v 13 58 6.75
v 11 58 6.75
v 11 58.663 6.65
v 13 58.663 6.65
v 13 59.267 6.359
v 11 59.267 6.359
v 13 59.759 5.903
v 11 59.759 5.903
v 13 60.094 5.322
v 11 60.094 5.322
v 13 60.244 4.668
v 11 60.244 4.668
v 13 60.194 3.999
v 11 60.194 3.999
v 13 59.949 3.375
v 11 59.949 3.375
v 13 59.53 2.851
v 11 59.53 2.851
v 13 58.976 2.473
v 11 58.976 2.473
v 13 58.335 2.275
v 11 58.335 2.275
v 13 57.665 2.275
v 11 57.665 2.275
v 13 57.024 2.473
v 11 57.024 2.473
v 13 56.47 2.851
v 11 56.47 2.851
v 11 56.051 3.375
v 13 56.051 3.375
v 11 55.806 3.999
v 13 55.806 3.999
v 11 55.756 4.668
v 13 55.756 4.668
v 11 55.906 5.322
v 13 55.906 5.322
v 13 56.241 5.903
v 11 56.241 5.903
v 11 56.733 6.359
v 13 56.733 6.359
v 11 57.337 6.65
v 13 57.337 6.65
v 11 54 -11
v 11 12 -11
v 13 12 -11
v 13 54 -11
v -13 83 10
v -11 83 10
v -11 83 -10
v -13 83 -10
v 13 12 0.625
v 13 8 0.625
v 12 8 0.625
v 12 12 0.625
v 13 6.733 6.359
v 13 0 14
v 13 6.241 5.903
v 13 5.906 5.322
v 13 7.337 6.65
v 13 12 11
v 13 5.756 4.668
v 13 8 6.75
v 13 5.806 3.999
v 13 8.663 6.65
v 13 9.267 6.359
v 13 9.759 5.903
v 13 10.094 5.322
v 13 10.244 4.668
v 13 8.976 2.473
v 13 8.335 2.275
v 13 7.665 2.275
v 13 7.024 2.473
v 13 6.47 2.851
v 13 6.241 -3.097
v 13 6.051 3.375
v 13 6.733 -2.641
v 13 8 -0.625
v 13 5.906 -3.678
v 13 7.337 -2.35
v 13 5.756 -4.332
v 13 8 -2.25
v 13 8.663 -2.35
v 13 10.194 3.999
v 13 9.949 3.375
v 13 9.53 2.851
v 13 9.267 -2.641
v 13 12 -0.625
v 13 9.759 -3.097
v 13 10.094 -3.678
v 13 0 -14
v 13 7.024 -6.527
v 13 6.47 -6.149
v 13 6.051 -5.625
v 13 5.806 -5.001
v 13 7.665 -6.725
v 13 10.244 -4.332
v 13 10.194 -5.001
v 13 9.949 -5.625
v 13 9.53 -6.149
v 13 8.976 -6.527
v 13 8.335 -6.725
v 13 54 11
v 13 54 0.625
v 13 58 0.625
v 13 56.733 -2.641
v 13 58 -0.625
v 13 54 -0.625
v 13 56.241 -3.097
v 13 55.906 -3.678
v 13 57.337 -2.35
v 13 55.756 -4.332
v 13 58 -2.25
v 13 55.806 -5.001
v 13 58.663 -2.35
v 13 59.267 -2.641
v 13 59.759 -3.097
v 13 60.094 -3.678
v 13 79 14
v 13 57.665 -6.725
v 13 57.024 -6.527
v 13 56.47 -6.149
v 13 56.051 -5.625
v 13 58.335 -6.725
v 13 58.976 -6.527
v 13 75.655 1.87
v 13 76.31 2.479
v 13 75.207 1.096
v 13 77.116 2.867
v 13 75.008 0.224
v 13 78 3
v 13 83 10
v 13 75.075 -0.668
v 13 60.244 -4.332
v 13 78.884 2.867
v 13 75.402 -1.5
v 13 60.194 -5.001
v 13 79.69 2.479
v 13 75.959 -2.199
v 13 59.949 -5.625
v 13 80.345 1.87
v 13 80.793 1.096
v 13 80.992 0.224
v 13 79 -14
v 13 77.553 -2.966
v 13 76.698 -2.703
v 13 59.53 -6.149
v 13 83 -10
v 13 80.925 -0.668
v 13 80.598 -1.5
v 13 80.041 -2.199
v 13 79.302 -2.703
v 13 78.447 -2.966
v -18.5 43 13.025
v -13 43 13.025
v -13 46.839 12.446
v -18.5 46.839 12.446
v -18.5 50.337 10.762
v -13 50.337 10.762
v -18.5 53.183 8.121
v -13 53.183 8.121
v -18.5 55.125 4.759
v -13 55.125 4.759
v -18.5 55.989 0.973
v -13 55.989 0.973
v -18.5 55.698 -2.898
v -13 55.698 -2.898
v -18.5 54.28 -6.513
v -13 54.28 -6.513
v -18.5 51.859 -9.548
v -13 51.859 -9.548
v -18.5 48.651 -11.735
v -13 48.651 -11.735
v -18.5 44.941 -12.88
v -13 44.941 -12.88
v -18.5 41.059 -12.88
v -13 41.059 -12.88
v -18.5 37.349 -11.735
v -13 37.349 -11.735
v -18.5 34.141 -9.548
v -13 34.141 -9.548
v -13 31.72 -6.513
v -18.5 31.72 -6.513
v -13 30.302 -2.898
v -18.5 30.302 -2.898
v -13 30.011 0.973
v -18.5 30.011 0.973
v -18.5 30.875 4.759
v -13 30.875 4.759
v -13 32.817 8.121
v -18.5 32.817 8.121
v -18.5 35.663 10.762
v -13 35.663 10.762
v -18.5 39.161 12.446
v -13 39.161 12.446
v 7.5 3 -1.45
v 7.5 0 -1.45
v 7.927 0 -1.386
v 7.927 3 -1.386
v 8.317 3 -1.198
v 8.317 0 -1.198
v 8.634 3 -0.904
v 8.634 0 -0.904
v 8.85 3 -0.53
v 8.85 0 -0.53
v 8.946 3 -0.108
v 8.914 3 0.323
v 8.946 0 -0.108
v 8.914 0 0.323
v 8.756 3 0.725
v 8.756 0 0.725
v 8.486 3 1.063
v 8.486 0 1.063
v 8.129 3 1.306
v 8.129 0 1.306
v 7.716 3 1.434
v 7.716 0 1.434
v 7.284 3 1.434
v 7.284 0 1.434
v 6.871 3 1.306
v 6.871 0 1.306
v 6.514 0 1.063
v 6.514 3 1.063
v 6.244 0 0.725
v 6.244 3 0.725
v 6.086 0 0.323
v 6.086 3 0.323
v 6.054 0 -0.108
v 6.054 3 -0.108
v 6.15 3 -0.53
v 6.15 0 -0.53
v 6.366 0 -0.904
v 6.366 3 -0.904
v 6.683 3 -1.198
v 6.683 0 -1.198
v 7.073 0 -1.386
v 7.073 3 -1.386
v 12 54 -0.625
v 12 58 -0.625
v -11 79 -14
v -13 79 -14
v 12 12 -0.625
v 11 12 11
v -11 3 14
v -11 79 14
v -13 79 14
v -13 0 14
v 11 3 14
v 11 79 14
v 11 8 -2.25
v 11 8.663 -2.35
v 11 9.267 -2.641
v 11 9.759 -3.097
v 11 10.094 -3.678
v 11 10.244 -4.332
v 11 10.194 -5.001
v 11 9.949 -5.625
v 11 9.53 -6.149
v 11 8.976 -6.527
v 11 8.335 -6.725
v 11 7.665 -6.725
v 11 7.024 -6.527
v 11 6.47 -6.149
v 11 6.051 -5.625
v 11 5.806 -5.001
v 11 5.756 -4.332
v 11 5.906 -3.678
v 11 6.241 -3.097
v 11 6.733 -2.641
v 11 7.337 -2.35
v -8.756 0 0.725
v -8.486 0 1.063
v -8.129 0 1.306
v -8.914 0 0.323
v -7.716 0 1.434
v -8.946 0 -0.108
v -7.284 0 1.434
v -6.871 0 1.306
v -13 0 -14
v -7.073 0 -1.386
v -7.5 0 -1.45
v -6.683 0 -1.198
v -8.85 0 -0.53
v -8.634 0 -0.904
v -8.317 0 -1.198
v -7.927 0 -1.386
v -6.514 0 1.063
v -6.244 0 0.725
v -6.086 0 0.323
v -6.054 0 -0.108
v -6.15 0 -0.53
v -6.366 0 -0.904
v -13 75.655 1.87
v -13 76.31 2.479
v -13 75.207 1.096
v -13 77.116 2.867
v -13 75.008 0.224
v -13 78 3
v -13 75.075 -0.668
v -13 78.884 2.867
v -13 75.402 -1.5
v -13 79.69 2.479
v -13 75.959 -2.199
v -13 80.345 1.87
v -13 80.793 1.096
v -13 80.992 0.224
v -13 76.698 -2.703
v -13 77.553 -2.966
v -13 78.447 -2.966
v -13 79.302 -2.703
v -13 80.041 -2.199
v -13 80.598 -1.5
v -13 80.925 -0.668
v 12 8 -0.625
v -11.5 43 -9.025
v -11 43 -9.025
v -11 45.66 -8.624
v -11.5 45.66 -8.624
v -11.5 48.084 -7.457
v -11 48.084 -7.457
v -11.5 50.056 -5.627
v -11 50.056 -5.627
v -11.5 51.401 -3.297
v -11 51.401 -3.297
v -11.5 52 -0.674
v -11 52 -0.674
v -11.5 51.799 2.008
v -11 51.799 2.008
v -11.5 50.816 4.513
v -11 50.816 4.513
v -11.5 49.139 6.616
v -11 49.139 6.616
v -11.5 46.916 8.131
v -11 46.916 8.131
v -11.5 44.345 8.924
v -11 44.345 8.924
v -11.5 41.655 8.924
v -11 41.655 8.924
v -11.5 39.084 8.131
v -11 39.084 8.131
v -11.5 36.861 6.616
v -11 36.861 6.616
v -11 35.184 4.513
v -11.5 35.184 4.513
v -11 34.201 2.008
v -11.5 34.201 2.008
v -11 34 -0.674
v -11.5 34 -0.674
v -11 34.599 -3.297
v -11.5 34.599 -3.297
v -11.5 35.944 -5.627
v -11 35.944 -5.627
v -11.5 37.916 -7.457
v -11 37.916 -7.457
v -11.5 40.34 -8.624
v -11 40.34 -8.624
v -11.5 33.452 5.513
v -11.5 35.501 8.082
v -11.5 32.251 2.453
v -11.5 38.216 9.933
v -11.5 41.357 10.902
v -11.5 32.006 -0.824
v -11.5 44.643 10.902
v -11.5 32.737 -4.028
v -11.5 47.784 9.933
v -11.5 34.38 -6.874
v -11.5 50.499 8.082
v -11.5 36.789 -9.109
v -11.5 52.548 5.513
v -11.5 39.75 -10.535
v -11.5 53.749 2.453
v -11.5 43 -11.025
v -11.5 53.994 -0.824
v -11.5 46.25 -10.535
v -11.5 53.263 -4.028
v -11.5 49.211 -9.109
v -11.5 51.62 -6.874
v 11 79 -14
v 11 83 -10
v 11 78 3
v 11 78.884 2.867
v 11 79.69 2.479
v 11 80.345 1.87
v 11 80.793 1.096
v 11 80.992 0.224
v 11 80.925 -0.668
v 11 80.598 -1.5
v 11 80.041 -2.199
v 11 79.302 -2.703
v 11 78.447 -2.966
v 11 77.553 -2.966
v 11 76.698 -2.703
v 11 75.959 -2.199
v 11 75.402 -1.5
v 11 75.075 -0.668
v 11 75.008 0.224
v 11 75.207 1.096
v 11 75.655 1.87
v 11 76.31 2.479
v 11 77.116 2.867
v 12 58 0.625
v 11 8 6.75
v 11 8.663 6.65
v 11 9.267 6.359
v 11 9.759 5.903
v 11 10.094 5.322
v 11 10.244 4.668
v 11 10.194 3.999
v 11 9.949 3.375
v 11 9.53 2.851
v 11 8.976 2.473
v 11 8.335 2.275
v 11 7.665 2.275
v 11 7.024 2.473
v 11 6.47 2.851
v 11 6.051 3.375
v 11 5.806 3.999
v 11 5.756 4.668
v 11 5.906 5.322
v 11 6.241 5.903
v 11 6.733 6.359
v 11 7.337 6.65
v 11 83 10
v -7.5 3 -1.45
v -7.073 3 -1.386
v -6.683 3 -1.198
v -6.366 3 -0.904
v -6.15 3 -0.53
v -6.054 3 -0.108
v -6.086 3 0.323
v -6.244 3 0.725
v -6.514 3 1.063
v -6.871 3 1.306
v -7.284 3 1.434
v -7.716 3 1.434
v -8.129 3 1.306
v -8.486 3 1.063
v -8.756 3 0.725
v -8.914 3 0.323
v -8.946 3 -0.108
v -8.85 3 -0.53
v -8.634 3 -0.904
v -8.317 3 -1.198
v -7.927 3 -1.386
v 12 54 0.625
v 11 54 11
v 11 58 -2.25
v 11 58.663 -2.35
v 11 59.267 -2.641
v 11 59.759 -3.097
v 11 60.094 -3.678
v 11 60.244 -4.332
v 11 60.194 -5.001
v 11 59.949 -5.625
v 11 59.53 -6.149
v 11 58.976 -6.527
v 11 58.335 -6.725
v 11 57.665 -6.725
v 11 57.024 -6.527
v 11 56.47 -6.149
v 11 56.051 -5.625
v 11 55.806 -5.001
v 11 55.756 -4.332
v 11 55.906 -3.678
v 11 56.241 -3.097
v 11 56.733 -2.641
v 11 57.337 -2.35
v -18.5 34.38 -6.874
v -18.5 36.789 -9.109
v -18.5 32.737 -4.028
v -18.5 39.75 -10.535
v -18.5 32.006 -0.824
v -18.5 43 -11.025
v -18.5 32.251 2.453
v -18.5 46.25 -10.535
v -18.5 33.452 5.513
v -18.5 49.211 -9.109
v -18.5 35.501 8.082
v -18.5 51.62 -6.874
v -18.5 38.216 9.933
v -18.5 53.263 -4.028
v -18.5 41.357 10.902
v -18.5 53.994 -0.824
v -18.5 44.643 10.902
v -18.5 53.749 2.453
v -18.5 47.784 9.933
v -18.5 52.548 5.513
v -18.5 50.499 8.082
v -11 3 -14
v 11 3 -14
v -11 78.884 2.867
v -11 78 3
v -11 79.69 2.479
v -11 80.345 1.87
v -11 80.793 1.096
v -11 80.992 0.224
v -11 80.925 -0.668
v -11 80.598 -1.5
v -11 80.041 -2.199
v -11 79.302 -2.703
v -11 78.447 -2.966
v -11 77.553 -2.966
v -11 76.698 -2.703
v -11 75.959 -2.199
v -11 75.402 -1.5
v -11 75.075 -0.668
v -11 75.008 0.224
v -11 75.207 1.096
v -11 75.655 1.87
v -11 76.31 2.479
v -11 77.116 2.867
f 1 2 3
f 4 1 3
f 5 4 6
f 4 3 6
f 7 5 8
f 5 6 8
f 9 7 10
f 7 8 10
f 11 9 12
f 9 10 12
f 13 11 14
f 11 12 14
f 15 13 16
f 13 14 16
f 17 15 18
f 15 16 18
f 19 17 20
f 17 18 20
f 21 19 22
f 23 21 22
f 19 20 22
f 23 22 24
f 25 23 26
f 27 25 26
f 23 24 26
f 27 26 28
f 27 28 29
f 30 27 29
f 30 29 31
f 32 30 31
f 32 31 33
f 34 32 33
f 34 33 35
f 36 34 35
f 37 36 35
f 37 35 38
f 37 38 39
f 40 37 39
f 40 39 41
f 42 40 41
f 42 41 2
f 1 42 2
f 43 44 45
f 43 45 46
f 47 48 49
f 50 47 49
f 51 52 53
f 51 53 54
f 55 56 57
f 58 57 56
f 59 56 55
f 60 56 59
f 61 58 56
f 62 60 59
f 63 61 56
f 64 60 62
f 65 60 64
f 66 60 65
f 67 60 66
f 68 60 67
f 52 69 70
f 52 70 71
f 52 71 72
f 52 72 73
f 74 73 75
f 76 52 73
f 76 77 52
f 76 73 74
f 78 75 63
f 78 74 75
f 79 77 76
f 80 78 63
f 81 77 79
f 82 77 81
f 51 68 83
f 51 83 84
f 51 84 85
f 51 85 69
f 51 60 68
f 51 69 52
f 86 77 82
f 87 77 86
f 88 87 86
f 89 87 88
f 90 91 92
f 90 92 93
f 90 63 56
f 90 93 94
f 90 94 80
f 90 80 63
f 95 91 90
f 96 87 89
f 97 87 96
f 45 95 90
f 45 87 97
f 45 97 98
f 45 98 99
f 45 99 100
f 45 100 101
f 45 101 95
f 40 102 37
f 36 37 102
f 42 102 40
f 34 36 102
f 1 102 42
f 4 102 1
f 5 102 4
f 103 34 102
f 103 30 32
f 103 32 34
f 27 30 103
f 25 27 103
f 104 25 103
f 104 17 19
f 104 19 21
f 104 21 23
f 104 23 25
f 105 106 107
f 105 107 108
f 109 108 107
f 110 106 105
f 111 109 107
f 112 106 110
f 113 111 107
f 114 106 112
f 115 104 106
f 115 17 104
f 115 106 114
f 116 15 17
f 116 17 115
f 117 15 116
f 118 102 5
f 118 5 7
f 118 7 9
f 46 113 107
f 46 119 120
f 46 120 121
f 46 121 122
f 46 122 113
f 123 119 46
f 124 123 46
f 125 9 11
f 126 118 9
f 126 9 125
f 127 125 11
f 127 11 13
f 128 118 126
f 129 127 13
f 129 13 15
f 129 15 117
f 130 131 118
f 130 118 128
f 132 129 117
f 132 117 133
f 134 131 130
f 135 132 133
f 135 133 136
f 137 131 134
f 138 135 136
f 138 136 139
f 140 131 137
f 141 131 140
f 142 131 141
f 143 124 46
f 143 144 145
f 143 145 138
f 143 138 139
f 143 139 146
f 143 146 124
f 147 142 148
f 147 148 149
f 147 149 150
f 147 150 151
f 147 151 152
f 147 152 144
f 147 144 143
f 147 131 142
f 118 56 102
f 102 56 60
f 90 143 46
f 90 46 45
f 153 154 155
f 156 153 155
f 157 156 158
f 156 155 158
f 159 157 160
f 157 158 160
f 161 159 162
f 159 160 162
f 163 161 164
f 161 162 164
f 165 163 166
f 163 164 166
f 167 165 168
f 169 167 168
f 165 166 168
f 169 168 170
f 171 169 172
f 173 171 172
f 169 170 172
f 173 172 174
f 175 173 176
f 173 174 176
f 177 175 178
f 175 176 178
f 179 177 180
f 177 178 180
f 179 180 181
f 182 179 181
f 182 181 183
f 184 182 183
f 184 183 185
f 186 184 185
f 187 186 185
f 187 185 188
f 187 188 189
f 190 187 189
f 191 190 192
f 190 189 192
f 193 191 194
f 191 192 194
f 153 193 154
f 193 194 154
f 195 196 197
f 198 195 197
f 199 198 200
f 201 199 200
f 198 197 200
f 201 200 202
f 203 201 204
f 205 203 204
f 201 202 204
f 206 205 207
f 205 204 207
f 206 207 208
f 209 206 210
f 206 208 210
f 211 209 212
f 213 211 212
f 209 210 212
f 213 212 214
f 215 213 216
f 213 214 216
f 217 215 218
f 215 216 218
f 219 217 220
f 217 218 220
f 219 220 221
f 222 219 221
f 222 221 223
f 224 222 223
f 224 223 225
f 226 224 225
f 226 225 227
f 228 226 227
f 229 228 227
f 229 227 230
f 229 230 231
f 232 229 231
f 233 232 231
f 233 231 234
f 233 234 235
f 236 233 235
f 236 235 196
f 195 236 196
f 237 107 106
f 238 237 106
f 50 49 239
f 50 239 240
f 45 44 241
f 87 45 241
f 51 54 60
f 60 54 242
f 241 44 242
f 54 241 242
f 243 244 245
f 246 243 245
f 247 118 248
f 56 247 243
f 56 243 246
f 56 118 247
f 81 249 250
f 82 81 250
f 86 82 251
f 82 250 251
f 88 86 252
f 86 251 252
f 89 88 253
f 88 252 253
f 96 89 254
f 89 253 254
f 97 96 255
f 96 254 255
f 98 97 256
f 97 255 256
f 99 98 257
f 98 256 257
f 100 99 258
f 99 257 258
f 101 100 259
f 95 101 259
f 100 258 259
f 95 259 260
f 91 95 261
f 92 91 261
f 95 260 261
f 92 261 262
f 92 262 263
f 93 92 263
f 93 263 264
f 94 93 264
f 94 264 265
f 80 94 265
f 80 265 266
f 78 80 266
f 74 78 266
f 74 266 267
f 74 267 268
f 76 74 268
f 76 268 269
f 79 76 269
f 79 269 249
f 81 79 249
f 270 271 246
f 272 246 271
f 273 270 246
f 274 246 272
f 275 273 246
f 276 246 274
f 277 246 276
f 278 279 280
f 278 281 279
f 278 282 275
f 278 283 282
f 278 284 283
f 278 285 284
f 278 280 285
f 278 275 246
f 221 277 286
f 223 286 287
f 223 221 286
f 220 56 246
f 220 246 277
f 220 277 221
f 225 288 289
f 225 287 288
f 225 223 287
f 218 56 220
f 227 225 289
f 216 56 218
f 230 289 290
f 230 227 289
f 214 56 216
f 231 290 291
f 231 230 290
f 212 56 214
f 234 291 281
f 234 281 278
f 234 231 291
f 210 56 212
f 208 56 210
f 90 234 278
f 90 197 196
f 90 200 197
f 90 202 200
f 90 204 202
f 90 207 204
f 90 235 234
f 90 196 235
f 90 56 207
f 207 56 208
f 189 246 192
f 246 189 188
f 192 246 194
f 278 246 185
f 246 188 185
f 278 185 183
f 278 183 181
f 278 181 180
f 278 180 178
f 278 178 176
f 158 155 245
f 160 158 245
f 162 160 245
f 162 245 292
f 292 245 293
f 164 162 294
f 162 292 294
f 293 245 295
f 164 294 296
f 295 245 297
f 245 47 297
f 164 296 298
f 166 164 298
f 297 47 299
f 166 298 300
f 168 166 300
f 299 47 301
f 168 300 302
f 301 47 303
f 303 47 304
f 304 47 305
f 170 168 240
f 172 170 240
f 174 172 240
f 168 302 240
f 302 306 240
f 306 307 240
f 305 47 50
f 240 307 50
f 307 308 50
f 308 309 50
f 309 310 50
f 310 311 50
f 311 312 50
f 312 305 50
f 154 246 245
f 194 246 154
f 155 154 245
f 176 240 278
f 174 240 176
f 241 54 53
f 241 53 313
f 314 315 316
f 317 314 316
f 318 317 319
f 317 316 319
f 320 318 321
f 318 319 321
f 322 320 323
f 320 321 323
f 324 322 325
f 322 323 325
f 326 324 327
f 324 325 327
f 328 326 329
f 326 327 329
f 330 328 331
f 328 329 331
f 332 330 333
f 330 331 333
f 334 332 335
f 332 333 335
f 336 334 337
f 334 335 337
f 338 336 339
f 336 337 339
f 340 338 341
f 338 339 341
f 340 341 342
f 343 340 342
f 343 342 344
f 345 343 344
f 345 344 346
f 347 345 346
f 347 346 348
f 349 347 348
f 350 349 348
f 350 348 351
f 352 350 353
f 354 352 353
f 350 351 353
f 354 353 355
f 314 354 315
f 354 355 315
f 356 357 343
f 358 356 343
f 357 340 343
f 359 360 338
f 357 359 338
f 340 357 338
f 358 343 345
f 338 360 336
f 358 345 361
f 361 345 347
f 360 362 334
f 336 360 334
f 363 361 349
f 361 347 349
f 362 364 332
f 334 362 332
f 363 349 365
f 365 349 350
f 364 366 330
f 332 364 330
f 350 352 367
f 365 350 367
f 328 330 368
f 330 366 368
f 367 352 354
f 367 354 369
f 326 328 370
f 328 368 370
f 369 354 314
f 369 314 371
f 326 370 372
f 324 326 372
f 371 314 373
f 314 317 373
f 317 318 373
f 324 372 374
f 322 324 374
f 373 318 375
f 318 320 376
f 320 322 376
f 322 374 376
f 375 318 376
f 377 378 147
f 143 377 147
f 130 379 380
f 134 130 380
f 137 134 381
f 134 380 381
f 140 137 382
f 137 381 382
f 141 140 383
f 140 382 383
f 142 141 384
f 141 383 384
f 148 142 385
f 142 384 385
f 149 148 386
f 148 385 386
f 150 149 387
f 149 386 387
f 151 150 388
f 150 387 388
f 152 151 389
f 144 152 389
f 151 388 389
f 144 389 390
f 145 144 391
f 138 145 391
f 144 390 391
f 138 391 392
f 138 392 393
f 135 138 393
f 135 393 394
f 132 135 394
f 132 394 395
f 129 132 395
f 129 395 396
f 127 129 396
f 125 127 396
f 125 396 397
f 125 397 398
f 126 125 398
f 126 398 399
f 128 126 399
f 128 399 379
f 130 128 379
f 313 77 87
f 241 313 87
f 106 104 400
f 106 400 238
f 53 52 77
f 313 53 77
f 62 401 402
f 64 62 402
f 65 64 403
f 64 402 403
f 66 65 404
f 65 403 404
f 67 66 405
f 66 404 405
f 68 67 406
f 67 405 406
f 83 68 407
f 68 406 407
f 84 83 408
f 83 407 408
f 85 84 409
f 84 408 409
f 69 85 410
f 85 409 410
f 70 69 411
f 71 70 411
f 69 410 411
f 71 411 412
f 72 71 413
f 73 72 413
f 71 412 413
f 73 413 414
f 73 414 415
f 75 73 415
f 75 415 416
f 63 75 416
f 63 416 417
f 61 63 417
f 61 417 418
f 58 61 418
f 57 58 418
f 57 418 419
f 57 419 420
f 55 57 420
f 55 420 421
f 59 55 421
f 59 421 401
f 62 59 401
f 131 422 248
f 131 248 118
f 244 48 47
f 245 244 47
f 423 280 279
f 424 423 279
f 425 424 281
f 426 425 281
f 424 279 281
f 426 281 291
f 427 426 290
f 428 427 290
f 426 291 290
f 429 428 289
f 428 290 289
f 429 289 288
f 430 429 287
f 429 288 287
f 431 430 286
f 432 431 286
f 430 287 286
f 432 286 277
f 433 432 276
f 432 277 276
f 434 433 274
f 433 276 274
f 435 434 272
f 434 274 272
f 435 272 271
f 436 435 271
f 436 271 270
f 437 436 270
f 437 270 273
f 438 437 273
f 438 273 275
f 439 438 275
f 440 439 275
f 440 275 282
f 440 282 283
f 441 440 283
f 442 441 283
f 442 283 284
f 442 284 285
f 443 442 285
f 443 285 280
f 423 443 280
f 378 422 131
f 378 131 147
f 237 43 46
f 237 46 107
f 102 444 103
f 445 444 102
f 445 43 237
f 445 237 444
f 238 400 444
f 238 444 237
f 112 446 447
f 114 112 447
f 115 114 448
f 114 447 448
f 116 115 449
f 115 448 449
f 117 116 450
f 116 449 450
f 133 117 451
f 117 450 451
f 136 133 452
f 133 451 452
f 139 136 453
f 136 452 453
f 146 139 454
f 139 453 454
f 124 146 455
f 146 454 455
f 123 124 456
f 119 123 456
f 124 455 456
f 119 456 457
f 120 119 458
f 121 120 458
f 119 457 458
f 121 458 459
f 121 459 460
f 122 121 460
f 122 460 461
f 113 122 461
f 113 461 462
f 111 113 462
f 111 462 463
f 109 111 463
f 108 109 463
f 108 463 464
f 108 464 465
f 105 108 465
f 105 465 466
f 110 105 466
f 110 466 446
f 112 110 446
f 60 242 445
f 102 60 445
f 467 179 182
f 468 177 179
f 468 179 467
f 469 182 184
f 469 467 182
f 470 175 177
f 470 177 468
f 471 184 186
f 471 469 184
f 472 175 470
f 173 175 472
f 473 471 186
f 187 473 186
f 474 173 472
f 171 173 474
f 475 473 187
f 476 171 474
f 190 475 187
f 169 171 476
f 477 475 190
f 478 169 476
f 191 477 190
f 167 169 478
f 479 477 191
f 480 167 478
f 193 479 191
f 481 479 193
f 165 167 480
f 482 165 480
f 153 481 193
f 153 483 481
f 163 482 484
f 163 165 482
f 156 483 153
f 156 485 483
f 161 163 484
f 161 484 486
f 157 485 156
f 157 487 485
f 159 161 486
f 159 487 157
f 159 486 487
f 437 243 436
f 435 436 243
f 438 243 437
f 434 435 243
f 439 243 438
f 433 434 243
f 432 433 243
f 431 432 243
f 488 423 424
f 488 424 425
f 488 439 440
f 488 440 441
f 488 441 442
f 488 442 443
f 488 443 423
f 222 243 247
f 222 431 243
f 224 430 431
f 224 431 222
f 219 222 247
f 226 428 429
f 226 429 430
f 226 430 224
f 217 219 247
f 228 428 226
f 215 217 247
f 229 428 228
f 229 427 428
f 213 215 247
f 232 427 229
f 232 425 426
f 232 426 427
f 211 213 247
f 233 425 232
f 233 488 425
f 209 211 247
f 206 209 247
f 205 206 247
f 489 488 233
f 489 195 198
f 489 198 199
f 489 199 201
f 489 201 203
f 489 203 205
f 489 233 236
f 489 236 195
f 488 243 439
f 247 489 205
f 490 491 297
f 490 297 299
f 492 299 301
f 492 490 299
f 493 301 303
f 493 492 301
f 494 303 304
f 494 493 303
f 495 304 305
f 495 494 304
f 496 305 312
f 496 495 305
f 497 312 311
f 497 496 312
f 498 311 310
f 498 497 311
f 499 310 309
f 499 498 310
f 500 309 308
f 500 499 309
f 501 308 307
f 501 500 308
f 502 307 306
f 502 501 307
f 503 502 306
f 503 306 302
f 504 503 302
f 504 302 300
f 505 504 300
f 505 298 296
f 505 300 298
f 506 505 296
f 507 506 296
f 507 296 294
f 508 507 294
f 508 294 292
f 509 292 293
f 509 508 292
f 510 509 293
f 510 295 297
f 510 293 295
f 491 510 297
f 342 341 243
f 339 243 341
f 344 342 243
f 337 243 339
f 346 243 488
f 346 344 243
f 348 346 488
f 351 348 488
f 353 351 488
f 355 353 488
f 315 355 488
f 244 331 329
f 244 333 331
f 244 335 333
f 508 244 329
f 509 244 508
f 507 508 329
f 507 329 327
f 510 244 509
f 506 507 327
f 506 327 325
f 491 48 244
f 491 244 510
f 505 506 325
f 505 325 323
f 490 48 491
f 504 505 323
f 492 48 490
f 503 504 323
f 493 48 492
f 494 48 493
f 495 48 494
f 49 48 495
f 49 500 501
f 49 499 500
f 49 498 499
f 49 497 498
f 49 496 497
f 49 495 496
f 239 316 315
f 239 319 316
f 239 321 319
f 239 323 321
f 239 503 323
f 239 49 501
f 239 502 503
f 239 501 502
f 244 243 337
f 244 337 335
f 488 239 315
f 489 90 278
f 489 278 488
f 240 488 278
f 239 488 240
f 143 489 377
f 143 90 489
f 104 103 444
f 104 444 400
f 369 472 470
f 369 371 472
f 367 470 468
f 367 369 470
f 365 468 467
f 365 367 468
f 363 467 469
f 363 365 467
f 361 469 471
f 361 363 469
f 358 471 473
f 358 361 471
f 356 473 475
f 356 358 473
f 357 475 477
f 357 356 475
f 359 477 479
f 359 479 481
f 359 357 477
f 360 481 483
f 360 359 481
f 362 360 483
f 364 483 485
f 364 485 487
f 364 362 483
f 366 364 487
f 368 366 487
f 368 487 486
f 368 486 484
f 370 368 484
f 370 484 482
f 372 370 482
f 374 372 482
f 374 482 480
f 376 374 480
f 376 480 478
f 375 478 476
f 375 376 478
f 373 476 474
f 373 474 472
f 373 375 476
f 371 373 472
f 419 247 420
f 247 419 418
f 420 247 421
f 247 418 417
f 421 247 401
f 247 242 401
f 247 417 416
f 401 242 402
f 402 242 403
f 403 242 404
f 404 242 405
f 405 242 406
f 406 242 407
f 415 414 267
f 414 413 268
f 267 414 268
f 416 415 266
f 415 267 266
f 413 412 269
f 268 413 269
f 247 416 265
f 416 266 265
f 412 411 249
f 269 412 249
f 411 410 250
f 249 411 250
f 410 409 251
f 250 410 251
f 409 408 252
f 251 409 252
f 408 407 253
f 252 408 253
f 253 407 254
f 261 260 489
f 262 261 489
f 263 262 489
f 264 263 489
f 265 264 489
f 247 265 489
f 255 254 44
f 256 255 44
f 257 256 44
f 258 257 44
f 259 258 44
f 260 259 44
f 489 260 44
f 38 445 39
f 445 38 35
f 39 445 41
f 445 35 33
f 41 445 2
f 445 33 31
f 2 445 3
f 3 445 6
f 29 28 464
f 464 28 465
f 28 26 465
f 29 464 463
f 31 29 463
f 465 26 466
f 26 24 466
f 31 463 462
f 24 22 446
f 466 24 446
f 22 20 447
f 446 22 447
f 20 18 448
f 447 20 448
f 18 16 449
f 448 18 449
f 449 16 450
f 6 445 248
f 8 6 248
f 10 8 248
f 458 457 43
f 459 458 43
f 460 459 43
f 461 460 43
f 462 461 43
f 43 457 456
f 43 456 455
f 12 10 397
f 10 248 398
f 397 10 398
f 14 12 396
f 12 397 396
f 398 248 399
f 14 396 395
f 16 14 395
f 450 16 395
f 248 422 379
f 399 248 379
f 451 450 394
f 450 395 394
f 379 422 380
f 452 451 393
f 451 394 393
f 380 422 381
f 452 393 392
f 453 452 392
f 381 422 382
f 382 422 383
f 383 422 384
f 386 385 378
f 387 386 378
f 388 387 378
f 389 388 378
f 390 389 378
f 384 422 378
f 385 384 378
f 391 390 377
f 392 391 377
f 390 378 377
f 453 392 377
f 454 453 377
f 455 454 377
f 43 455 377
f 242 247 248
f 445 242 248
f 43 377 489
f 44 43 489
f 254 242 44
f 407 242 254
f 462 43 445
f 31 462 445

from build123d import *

# Parameters (mm, degrees)
SKETCH1_W               = 22
SKETCH1_H               = 28
BOSS_EXTRUDE1_DEPTH     = 3
SKETCH2_R               = 1.45
CUT_EXTRUDE1_DEPTH      = 4
SKETCH3_W               = 28
SKETCH3_H               = 80
SKETCH3_H_2             = 3
BOSS_EXTRUDE2_DEPTH     = 2
SKETCH4_R               = 2.25
SKETCH4_W               = 22
SKETCH4_H               = 42
CUT_EXTRUDE2_DEPTH      = 10
SKETCH5_R               = 11.025
CUT_EXTRUDE3_DEPTH      = 10
SKETCH6_R               = 11.025
SKETCH6_R_2             = 9.025
BOSS_EXTRUDE3_DEPTH     = 0.5
SKETCH7_R               = 13.025
SKETCH7_R_2             = 11.025
BOSS_EXTRUDE4_DEPTH     = 5.5
SKETCH9_W               = 1.25
SKETCH9_H               = 4
CUT_EXTRUDE5_DEPTH      = 1
SKETCH4_4_R             = 3
CUT_EXTRUDE6_DEPTH      = 30.5
CUT_EXTRUDE6_DEPTH_BACK = 3
CHAMFER1_SIZE           = 4


with BuildPart() as part:
    # Sketch1 → Boss-Extrude1 (new body)
    with BuildSketch(Plane(origin=(0, 0, 0), x_dir=(1, 0, 0), z_dir=(0, 1, 0))):
        Rectangle(SKETCH1_W, SKETCH1_H)
    extrude(amount=BOSS_EXTRUDE1_DEPTH)

    # Sketch2 → Cut-Extrude1 (cut, through all)
    with BuildSketch(Plane.XZ):
        with Locations(Location((-7.5, 0, 0), (0, 0, 270))):  # turned: the seam where the file's is
            Circle(SKETCH2_R)
        with Locations(Location((7.5, 0, 0), (0, 0, 270))):  # turned: the seam where the file's is
            Circle(SKETCH2_R)
    extrude(amount=-CUT_EXTRUDE1_DEPTH, mode=Mode.SUBTRACT)

    # Sketch3 → Boss-Extrude2 (add)
    with BuildSketch(Plane(origin=(11, 0, 0), x_dir=(0, 0, -1), z_dir=(1, 0, 0))):
        with Locations((0, 43)):
            Rectangle(SKETCH3_W, SKETCH3_H)
        with Locations((0, 1.5)):
            Rectangle(SKETCH3_W, SKETCH3_H_2)
    boss_extrude2 = extrude(amount=BOSS_EXTRUDE2_DEPTH)

    # Sketch4 → Cut-Extrude2 (cut)
    with BuildSketch(Plane.ZY.offset(-11)):
        with Locations((-4.5, 8)):
            Circle(SKETCH4_R)
        with Locations((4.5, 8)):
            Circle(SKETCH4_R)
        with Locations((4.5, 58)):
            Circle(SKETCH4_R)
        with Locations((-4.5, 58)):
            Circle(SKETCH4_R)
        with Locations((0, 33)):
            Rectangle(SKETCH4_W, SKETCH4_H)
    extrude(amount=-CUT_EXTRUDE2_DEPTH, mode=Mode.SUBTRACT)

    # Mirror1: Boss-Extrude2 across plane
    add(boss_extrude2.mirror(Plane(origin=(0, 0, 0), x_dir=(0, 0, 1), z_dir=(1, 0, 0))))

    # Sketch5 → Cut-Extrude3 (cut)
    with BuildSketch(Plane(origin=(-11, 0, 0), x_dir=(0, 0, -1), z_dir=(1, 0, 0))):
        with Locations((0, 43)):
            Circle(SKETCH5_R)
    extrude(amount=-CUT_EXTRUDE3_DEPTH, mode=Mode.SUBTRACT)

    # Sketch6 → Boss-Extrude3 (add)
    with BuildSketch(Plane(origin=(-11, 0, 0), x_dir=(0, 0, -1), z_dir=(1, 0, 0))):
        with Locations((0, 43)):
            Circle(SKETCH6_R)
        with Locations((0, 43)):
            Circle(SKETCH6_R_2, mode=Mode.SUBTRACT)
    extrude(amount=-BOSS_EXTRUDE3_DEPTH)

    # Sketch7 → Boss-Extrude4 (add)
    with BuildSketch(Plane.ZY.offset(13)):
        with Locations((0, 43)):
            Circle(SKETCH7_R)
        with Locations(Location((0, 43, 0), (0, 0, 180))):  # turned: the seam where the file's is
            Circle(SKETCH7_R_2, mode=Mode.SUBTRACT)
    extrude(amount=BOSS_EXTRUDE4_DEPTH)

    # Sketch9 → Cut-Extrude5 (cut)
    with BuildSketch(Plane(origin=(13, 0, 0), x_dir=(0, 0, -1), z_dir=(1, 0, 0))):
        with Locations((0, 56)):
            Rectangle(SKETCH9_W, SKETCH9_H)
        with Locations((0, 10)):
            Rectangle(SKETCH9_W, SKETCH9_H)
    extrude(amount=-CUT_EXTRUDE5_DEPTH, mode=Mode.SUBTRACT)

    # Sketch4_4 → Cut-Extrude6 (cut, two sides)
    with BuildSketch(Plane.ZY.offset(-11)) as cut_extrude6_sk:
        with Locations((0, 78)):
            Circle(SKETCH4_4_R)
    extrude(amount=CUT_EXTRUDE6_DEPTH, mode=Mode.SUBTRACT)
    extrude(cut_extrude6_sk.sketch, amount=-CUT_EXTRUDE6_DEPTH_BACK, mode=Mode.SUBTRACT)

    # Chamfer1
    chamfer1_edges = [part.edges().sort_by_distance(p)[0] for p in [
        (12, 83, 14),
        (12, 83, -14),
        (-12, 83, 14),
        (-12, 83, -14),
    ]]
    chamfer(chamfer1_edges, length=CHAMFER1_SIZE)


solid = part.part
